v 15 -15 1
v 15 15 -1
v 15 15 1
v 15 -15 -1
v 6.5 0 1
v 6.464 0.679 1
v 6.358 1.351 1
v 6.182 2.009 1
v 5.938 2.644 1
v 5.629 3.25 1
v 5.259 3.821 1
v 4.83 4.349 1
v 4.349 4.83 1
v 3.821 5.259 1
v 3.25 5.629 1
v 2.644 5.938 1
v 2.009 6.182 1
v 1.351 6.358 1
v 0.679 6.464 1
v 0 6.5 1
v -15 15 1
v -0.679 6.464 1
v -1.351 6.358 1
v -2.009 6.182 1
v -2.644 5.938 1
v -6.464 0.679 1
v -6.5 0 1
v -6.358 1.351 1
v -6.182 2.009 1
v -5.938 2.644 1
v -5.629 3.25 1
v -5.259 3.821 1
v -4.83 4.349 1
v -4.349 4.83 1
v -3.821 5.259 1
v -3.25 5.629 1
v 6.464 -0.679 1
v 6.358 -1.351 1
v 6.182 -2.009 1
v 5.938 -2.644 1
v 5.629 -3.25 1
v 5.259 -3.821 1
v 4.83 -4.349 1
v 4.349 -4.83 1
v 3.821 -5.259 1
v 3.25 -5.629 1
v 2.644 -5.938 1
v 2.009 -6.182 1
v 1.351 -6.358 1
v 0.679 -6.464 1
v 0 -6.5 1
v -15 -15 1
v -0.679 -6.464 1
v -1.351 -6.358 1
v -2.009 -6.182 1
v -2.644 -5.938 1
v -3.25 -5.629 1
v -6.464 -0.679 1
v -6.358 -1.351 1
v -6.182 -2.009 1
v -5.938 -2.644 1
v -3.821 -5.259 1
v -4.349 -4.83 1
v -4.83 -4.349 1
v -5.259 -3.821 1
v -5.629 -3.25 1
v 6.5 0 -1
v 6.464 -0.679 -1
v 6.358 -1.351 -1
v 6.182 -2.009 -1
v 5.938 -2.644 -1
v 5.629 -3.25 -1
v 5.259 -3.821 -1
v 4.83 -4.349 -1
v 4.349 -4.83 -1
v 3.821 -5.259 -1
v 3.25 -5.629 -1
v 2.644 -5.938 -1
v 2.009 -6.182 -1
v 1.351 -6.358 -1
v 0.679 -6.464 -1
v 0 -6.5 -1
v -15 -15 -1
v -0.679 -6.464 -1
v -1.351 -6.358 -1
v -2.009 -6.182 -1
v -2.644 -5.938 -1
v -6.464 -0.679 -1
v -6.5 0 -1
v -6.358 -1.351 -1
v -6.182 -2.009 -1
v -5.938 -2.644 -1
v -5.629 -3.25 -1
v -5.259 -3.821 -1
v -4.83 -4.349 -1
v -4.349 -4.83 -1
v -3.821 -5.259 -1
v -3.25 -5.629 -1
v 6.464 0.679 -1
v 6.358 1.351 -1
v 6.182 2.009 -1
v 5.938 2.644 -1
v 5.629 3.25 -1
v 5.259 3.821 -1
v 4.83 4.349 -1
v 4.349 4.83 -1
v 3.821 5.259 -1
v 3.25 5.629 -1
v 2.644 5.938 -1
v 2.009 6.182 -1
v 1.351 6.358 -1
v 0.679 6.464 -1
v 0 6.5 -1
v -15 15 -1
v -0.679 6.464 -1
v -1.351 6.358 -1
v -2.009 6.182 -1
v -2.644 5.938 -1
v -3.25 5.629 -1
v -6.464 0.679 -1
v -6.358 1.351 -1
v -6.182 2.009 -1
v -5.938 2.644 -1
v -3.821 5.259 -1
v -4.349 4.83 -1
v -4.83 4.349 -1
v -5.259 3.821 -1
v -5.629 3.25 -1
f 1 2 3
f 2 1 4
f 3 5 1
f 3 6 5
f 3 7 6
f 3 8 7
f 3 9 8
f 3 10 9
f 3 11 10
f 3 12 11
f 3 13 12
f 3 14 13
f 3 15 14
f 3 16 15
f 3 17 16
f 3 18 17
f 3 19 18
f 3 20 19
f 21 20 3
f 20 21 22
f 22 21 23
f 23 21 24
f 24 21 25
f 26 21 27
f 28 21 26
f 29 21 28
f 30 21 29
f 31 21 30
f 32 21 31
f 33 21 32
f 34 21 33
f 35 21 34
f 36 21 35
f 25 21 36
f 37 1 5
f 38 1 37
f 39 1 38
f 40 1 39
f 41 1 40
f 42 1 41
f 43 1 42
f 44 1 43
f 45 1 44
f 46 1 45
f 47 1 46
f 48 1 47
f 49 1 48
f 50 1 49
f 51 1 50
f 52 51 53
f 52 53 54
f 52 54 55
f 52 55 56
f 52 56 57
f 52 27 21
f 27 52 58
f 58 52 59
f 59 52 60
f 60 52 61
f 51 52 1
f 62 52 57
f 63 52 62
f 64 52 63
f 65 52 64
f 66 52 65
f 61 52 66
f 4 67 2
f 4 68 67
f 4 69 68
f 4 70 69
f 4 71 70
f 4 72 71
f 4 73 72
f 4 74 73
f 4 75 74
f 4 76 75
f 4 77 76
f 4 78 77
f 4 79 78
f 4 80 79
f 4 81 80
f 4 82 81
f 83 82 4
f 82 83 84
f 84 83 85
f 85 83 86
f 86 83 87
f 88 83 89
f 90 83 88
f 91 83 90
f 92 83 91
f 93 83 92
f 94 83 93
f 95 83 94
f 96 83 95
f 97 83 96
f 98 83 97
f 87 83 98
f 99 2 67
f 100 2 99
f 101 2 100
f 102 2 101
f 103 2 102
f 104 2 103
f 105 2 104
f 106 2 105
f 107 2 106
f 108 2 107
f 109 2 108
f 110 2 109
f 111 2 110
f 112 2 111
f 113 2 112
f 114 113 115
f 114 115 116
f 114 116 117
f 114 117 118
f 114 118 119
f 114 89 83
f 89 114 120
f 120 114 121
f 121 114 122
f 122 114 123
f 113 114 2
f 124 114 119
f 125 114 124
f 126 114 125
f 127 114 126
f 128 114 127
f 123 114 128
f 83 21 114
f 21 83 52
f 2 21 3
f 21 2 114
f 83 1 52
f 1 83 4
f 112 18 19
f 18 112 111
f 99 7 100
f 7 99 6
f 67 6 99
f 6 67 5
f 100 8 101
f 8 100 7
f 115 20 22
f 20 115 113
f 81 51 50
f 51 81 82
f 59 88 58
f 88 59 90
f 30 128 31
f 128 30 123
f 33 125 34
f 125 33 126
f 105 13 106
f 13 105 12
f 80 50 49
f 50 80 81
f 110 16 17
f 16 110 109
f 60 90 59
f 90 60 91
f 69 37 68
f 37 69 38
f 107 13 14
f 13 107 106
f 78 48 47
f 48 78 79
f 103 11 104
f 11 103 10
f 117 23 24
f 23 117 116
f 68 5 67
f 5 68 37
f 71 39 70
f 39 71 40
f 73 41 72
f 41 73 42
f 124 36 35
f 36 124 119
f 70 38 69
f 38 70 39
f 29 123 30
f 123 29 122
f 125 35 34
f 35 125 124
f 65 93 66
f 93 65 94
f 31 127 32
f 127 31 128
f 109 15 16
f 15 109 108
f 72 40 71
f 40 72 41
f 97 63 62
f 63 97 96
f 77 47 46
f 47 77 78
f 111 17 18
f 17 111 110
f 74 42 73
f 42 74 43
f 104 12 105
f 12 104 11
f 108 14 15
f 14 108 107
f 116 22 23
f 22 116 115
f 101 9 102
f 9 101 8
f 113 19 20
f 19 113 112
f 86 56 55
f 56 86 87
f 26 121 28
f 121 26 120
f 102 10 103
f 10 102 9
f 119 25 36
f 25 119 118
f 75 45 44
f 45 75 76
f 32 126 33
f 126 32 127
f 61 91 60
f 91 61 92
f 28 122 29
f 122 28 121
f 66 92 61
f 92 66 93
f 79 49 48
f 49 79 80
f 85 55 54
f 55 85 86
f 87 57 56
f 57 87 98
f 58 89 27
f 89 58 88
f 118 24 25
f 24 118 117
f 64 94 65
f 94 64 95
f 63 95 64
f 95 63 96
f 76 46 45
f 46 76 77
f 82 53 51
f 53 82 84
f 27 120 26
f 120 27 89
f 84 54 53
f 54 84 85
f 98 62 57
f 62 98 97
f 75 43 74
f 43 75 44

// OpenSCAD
// Square mounting washer.
$fn = 60;
eps = 0.02;
hole_d = 13;
side = 30;
thickness = 2;
difference() {
    cube([side,side,thickness],center=true);
    translate([0,0,-thickness/2-eps]) cylinder(d=hole_d,h=thickness+2*eps);
}
